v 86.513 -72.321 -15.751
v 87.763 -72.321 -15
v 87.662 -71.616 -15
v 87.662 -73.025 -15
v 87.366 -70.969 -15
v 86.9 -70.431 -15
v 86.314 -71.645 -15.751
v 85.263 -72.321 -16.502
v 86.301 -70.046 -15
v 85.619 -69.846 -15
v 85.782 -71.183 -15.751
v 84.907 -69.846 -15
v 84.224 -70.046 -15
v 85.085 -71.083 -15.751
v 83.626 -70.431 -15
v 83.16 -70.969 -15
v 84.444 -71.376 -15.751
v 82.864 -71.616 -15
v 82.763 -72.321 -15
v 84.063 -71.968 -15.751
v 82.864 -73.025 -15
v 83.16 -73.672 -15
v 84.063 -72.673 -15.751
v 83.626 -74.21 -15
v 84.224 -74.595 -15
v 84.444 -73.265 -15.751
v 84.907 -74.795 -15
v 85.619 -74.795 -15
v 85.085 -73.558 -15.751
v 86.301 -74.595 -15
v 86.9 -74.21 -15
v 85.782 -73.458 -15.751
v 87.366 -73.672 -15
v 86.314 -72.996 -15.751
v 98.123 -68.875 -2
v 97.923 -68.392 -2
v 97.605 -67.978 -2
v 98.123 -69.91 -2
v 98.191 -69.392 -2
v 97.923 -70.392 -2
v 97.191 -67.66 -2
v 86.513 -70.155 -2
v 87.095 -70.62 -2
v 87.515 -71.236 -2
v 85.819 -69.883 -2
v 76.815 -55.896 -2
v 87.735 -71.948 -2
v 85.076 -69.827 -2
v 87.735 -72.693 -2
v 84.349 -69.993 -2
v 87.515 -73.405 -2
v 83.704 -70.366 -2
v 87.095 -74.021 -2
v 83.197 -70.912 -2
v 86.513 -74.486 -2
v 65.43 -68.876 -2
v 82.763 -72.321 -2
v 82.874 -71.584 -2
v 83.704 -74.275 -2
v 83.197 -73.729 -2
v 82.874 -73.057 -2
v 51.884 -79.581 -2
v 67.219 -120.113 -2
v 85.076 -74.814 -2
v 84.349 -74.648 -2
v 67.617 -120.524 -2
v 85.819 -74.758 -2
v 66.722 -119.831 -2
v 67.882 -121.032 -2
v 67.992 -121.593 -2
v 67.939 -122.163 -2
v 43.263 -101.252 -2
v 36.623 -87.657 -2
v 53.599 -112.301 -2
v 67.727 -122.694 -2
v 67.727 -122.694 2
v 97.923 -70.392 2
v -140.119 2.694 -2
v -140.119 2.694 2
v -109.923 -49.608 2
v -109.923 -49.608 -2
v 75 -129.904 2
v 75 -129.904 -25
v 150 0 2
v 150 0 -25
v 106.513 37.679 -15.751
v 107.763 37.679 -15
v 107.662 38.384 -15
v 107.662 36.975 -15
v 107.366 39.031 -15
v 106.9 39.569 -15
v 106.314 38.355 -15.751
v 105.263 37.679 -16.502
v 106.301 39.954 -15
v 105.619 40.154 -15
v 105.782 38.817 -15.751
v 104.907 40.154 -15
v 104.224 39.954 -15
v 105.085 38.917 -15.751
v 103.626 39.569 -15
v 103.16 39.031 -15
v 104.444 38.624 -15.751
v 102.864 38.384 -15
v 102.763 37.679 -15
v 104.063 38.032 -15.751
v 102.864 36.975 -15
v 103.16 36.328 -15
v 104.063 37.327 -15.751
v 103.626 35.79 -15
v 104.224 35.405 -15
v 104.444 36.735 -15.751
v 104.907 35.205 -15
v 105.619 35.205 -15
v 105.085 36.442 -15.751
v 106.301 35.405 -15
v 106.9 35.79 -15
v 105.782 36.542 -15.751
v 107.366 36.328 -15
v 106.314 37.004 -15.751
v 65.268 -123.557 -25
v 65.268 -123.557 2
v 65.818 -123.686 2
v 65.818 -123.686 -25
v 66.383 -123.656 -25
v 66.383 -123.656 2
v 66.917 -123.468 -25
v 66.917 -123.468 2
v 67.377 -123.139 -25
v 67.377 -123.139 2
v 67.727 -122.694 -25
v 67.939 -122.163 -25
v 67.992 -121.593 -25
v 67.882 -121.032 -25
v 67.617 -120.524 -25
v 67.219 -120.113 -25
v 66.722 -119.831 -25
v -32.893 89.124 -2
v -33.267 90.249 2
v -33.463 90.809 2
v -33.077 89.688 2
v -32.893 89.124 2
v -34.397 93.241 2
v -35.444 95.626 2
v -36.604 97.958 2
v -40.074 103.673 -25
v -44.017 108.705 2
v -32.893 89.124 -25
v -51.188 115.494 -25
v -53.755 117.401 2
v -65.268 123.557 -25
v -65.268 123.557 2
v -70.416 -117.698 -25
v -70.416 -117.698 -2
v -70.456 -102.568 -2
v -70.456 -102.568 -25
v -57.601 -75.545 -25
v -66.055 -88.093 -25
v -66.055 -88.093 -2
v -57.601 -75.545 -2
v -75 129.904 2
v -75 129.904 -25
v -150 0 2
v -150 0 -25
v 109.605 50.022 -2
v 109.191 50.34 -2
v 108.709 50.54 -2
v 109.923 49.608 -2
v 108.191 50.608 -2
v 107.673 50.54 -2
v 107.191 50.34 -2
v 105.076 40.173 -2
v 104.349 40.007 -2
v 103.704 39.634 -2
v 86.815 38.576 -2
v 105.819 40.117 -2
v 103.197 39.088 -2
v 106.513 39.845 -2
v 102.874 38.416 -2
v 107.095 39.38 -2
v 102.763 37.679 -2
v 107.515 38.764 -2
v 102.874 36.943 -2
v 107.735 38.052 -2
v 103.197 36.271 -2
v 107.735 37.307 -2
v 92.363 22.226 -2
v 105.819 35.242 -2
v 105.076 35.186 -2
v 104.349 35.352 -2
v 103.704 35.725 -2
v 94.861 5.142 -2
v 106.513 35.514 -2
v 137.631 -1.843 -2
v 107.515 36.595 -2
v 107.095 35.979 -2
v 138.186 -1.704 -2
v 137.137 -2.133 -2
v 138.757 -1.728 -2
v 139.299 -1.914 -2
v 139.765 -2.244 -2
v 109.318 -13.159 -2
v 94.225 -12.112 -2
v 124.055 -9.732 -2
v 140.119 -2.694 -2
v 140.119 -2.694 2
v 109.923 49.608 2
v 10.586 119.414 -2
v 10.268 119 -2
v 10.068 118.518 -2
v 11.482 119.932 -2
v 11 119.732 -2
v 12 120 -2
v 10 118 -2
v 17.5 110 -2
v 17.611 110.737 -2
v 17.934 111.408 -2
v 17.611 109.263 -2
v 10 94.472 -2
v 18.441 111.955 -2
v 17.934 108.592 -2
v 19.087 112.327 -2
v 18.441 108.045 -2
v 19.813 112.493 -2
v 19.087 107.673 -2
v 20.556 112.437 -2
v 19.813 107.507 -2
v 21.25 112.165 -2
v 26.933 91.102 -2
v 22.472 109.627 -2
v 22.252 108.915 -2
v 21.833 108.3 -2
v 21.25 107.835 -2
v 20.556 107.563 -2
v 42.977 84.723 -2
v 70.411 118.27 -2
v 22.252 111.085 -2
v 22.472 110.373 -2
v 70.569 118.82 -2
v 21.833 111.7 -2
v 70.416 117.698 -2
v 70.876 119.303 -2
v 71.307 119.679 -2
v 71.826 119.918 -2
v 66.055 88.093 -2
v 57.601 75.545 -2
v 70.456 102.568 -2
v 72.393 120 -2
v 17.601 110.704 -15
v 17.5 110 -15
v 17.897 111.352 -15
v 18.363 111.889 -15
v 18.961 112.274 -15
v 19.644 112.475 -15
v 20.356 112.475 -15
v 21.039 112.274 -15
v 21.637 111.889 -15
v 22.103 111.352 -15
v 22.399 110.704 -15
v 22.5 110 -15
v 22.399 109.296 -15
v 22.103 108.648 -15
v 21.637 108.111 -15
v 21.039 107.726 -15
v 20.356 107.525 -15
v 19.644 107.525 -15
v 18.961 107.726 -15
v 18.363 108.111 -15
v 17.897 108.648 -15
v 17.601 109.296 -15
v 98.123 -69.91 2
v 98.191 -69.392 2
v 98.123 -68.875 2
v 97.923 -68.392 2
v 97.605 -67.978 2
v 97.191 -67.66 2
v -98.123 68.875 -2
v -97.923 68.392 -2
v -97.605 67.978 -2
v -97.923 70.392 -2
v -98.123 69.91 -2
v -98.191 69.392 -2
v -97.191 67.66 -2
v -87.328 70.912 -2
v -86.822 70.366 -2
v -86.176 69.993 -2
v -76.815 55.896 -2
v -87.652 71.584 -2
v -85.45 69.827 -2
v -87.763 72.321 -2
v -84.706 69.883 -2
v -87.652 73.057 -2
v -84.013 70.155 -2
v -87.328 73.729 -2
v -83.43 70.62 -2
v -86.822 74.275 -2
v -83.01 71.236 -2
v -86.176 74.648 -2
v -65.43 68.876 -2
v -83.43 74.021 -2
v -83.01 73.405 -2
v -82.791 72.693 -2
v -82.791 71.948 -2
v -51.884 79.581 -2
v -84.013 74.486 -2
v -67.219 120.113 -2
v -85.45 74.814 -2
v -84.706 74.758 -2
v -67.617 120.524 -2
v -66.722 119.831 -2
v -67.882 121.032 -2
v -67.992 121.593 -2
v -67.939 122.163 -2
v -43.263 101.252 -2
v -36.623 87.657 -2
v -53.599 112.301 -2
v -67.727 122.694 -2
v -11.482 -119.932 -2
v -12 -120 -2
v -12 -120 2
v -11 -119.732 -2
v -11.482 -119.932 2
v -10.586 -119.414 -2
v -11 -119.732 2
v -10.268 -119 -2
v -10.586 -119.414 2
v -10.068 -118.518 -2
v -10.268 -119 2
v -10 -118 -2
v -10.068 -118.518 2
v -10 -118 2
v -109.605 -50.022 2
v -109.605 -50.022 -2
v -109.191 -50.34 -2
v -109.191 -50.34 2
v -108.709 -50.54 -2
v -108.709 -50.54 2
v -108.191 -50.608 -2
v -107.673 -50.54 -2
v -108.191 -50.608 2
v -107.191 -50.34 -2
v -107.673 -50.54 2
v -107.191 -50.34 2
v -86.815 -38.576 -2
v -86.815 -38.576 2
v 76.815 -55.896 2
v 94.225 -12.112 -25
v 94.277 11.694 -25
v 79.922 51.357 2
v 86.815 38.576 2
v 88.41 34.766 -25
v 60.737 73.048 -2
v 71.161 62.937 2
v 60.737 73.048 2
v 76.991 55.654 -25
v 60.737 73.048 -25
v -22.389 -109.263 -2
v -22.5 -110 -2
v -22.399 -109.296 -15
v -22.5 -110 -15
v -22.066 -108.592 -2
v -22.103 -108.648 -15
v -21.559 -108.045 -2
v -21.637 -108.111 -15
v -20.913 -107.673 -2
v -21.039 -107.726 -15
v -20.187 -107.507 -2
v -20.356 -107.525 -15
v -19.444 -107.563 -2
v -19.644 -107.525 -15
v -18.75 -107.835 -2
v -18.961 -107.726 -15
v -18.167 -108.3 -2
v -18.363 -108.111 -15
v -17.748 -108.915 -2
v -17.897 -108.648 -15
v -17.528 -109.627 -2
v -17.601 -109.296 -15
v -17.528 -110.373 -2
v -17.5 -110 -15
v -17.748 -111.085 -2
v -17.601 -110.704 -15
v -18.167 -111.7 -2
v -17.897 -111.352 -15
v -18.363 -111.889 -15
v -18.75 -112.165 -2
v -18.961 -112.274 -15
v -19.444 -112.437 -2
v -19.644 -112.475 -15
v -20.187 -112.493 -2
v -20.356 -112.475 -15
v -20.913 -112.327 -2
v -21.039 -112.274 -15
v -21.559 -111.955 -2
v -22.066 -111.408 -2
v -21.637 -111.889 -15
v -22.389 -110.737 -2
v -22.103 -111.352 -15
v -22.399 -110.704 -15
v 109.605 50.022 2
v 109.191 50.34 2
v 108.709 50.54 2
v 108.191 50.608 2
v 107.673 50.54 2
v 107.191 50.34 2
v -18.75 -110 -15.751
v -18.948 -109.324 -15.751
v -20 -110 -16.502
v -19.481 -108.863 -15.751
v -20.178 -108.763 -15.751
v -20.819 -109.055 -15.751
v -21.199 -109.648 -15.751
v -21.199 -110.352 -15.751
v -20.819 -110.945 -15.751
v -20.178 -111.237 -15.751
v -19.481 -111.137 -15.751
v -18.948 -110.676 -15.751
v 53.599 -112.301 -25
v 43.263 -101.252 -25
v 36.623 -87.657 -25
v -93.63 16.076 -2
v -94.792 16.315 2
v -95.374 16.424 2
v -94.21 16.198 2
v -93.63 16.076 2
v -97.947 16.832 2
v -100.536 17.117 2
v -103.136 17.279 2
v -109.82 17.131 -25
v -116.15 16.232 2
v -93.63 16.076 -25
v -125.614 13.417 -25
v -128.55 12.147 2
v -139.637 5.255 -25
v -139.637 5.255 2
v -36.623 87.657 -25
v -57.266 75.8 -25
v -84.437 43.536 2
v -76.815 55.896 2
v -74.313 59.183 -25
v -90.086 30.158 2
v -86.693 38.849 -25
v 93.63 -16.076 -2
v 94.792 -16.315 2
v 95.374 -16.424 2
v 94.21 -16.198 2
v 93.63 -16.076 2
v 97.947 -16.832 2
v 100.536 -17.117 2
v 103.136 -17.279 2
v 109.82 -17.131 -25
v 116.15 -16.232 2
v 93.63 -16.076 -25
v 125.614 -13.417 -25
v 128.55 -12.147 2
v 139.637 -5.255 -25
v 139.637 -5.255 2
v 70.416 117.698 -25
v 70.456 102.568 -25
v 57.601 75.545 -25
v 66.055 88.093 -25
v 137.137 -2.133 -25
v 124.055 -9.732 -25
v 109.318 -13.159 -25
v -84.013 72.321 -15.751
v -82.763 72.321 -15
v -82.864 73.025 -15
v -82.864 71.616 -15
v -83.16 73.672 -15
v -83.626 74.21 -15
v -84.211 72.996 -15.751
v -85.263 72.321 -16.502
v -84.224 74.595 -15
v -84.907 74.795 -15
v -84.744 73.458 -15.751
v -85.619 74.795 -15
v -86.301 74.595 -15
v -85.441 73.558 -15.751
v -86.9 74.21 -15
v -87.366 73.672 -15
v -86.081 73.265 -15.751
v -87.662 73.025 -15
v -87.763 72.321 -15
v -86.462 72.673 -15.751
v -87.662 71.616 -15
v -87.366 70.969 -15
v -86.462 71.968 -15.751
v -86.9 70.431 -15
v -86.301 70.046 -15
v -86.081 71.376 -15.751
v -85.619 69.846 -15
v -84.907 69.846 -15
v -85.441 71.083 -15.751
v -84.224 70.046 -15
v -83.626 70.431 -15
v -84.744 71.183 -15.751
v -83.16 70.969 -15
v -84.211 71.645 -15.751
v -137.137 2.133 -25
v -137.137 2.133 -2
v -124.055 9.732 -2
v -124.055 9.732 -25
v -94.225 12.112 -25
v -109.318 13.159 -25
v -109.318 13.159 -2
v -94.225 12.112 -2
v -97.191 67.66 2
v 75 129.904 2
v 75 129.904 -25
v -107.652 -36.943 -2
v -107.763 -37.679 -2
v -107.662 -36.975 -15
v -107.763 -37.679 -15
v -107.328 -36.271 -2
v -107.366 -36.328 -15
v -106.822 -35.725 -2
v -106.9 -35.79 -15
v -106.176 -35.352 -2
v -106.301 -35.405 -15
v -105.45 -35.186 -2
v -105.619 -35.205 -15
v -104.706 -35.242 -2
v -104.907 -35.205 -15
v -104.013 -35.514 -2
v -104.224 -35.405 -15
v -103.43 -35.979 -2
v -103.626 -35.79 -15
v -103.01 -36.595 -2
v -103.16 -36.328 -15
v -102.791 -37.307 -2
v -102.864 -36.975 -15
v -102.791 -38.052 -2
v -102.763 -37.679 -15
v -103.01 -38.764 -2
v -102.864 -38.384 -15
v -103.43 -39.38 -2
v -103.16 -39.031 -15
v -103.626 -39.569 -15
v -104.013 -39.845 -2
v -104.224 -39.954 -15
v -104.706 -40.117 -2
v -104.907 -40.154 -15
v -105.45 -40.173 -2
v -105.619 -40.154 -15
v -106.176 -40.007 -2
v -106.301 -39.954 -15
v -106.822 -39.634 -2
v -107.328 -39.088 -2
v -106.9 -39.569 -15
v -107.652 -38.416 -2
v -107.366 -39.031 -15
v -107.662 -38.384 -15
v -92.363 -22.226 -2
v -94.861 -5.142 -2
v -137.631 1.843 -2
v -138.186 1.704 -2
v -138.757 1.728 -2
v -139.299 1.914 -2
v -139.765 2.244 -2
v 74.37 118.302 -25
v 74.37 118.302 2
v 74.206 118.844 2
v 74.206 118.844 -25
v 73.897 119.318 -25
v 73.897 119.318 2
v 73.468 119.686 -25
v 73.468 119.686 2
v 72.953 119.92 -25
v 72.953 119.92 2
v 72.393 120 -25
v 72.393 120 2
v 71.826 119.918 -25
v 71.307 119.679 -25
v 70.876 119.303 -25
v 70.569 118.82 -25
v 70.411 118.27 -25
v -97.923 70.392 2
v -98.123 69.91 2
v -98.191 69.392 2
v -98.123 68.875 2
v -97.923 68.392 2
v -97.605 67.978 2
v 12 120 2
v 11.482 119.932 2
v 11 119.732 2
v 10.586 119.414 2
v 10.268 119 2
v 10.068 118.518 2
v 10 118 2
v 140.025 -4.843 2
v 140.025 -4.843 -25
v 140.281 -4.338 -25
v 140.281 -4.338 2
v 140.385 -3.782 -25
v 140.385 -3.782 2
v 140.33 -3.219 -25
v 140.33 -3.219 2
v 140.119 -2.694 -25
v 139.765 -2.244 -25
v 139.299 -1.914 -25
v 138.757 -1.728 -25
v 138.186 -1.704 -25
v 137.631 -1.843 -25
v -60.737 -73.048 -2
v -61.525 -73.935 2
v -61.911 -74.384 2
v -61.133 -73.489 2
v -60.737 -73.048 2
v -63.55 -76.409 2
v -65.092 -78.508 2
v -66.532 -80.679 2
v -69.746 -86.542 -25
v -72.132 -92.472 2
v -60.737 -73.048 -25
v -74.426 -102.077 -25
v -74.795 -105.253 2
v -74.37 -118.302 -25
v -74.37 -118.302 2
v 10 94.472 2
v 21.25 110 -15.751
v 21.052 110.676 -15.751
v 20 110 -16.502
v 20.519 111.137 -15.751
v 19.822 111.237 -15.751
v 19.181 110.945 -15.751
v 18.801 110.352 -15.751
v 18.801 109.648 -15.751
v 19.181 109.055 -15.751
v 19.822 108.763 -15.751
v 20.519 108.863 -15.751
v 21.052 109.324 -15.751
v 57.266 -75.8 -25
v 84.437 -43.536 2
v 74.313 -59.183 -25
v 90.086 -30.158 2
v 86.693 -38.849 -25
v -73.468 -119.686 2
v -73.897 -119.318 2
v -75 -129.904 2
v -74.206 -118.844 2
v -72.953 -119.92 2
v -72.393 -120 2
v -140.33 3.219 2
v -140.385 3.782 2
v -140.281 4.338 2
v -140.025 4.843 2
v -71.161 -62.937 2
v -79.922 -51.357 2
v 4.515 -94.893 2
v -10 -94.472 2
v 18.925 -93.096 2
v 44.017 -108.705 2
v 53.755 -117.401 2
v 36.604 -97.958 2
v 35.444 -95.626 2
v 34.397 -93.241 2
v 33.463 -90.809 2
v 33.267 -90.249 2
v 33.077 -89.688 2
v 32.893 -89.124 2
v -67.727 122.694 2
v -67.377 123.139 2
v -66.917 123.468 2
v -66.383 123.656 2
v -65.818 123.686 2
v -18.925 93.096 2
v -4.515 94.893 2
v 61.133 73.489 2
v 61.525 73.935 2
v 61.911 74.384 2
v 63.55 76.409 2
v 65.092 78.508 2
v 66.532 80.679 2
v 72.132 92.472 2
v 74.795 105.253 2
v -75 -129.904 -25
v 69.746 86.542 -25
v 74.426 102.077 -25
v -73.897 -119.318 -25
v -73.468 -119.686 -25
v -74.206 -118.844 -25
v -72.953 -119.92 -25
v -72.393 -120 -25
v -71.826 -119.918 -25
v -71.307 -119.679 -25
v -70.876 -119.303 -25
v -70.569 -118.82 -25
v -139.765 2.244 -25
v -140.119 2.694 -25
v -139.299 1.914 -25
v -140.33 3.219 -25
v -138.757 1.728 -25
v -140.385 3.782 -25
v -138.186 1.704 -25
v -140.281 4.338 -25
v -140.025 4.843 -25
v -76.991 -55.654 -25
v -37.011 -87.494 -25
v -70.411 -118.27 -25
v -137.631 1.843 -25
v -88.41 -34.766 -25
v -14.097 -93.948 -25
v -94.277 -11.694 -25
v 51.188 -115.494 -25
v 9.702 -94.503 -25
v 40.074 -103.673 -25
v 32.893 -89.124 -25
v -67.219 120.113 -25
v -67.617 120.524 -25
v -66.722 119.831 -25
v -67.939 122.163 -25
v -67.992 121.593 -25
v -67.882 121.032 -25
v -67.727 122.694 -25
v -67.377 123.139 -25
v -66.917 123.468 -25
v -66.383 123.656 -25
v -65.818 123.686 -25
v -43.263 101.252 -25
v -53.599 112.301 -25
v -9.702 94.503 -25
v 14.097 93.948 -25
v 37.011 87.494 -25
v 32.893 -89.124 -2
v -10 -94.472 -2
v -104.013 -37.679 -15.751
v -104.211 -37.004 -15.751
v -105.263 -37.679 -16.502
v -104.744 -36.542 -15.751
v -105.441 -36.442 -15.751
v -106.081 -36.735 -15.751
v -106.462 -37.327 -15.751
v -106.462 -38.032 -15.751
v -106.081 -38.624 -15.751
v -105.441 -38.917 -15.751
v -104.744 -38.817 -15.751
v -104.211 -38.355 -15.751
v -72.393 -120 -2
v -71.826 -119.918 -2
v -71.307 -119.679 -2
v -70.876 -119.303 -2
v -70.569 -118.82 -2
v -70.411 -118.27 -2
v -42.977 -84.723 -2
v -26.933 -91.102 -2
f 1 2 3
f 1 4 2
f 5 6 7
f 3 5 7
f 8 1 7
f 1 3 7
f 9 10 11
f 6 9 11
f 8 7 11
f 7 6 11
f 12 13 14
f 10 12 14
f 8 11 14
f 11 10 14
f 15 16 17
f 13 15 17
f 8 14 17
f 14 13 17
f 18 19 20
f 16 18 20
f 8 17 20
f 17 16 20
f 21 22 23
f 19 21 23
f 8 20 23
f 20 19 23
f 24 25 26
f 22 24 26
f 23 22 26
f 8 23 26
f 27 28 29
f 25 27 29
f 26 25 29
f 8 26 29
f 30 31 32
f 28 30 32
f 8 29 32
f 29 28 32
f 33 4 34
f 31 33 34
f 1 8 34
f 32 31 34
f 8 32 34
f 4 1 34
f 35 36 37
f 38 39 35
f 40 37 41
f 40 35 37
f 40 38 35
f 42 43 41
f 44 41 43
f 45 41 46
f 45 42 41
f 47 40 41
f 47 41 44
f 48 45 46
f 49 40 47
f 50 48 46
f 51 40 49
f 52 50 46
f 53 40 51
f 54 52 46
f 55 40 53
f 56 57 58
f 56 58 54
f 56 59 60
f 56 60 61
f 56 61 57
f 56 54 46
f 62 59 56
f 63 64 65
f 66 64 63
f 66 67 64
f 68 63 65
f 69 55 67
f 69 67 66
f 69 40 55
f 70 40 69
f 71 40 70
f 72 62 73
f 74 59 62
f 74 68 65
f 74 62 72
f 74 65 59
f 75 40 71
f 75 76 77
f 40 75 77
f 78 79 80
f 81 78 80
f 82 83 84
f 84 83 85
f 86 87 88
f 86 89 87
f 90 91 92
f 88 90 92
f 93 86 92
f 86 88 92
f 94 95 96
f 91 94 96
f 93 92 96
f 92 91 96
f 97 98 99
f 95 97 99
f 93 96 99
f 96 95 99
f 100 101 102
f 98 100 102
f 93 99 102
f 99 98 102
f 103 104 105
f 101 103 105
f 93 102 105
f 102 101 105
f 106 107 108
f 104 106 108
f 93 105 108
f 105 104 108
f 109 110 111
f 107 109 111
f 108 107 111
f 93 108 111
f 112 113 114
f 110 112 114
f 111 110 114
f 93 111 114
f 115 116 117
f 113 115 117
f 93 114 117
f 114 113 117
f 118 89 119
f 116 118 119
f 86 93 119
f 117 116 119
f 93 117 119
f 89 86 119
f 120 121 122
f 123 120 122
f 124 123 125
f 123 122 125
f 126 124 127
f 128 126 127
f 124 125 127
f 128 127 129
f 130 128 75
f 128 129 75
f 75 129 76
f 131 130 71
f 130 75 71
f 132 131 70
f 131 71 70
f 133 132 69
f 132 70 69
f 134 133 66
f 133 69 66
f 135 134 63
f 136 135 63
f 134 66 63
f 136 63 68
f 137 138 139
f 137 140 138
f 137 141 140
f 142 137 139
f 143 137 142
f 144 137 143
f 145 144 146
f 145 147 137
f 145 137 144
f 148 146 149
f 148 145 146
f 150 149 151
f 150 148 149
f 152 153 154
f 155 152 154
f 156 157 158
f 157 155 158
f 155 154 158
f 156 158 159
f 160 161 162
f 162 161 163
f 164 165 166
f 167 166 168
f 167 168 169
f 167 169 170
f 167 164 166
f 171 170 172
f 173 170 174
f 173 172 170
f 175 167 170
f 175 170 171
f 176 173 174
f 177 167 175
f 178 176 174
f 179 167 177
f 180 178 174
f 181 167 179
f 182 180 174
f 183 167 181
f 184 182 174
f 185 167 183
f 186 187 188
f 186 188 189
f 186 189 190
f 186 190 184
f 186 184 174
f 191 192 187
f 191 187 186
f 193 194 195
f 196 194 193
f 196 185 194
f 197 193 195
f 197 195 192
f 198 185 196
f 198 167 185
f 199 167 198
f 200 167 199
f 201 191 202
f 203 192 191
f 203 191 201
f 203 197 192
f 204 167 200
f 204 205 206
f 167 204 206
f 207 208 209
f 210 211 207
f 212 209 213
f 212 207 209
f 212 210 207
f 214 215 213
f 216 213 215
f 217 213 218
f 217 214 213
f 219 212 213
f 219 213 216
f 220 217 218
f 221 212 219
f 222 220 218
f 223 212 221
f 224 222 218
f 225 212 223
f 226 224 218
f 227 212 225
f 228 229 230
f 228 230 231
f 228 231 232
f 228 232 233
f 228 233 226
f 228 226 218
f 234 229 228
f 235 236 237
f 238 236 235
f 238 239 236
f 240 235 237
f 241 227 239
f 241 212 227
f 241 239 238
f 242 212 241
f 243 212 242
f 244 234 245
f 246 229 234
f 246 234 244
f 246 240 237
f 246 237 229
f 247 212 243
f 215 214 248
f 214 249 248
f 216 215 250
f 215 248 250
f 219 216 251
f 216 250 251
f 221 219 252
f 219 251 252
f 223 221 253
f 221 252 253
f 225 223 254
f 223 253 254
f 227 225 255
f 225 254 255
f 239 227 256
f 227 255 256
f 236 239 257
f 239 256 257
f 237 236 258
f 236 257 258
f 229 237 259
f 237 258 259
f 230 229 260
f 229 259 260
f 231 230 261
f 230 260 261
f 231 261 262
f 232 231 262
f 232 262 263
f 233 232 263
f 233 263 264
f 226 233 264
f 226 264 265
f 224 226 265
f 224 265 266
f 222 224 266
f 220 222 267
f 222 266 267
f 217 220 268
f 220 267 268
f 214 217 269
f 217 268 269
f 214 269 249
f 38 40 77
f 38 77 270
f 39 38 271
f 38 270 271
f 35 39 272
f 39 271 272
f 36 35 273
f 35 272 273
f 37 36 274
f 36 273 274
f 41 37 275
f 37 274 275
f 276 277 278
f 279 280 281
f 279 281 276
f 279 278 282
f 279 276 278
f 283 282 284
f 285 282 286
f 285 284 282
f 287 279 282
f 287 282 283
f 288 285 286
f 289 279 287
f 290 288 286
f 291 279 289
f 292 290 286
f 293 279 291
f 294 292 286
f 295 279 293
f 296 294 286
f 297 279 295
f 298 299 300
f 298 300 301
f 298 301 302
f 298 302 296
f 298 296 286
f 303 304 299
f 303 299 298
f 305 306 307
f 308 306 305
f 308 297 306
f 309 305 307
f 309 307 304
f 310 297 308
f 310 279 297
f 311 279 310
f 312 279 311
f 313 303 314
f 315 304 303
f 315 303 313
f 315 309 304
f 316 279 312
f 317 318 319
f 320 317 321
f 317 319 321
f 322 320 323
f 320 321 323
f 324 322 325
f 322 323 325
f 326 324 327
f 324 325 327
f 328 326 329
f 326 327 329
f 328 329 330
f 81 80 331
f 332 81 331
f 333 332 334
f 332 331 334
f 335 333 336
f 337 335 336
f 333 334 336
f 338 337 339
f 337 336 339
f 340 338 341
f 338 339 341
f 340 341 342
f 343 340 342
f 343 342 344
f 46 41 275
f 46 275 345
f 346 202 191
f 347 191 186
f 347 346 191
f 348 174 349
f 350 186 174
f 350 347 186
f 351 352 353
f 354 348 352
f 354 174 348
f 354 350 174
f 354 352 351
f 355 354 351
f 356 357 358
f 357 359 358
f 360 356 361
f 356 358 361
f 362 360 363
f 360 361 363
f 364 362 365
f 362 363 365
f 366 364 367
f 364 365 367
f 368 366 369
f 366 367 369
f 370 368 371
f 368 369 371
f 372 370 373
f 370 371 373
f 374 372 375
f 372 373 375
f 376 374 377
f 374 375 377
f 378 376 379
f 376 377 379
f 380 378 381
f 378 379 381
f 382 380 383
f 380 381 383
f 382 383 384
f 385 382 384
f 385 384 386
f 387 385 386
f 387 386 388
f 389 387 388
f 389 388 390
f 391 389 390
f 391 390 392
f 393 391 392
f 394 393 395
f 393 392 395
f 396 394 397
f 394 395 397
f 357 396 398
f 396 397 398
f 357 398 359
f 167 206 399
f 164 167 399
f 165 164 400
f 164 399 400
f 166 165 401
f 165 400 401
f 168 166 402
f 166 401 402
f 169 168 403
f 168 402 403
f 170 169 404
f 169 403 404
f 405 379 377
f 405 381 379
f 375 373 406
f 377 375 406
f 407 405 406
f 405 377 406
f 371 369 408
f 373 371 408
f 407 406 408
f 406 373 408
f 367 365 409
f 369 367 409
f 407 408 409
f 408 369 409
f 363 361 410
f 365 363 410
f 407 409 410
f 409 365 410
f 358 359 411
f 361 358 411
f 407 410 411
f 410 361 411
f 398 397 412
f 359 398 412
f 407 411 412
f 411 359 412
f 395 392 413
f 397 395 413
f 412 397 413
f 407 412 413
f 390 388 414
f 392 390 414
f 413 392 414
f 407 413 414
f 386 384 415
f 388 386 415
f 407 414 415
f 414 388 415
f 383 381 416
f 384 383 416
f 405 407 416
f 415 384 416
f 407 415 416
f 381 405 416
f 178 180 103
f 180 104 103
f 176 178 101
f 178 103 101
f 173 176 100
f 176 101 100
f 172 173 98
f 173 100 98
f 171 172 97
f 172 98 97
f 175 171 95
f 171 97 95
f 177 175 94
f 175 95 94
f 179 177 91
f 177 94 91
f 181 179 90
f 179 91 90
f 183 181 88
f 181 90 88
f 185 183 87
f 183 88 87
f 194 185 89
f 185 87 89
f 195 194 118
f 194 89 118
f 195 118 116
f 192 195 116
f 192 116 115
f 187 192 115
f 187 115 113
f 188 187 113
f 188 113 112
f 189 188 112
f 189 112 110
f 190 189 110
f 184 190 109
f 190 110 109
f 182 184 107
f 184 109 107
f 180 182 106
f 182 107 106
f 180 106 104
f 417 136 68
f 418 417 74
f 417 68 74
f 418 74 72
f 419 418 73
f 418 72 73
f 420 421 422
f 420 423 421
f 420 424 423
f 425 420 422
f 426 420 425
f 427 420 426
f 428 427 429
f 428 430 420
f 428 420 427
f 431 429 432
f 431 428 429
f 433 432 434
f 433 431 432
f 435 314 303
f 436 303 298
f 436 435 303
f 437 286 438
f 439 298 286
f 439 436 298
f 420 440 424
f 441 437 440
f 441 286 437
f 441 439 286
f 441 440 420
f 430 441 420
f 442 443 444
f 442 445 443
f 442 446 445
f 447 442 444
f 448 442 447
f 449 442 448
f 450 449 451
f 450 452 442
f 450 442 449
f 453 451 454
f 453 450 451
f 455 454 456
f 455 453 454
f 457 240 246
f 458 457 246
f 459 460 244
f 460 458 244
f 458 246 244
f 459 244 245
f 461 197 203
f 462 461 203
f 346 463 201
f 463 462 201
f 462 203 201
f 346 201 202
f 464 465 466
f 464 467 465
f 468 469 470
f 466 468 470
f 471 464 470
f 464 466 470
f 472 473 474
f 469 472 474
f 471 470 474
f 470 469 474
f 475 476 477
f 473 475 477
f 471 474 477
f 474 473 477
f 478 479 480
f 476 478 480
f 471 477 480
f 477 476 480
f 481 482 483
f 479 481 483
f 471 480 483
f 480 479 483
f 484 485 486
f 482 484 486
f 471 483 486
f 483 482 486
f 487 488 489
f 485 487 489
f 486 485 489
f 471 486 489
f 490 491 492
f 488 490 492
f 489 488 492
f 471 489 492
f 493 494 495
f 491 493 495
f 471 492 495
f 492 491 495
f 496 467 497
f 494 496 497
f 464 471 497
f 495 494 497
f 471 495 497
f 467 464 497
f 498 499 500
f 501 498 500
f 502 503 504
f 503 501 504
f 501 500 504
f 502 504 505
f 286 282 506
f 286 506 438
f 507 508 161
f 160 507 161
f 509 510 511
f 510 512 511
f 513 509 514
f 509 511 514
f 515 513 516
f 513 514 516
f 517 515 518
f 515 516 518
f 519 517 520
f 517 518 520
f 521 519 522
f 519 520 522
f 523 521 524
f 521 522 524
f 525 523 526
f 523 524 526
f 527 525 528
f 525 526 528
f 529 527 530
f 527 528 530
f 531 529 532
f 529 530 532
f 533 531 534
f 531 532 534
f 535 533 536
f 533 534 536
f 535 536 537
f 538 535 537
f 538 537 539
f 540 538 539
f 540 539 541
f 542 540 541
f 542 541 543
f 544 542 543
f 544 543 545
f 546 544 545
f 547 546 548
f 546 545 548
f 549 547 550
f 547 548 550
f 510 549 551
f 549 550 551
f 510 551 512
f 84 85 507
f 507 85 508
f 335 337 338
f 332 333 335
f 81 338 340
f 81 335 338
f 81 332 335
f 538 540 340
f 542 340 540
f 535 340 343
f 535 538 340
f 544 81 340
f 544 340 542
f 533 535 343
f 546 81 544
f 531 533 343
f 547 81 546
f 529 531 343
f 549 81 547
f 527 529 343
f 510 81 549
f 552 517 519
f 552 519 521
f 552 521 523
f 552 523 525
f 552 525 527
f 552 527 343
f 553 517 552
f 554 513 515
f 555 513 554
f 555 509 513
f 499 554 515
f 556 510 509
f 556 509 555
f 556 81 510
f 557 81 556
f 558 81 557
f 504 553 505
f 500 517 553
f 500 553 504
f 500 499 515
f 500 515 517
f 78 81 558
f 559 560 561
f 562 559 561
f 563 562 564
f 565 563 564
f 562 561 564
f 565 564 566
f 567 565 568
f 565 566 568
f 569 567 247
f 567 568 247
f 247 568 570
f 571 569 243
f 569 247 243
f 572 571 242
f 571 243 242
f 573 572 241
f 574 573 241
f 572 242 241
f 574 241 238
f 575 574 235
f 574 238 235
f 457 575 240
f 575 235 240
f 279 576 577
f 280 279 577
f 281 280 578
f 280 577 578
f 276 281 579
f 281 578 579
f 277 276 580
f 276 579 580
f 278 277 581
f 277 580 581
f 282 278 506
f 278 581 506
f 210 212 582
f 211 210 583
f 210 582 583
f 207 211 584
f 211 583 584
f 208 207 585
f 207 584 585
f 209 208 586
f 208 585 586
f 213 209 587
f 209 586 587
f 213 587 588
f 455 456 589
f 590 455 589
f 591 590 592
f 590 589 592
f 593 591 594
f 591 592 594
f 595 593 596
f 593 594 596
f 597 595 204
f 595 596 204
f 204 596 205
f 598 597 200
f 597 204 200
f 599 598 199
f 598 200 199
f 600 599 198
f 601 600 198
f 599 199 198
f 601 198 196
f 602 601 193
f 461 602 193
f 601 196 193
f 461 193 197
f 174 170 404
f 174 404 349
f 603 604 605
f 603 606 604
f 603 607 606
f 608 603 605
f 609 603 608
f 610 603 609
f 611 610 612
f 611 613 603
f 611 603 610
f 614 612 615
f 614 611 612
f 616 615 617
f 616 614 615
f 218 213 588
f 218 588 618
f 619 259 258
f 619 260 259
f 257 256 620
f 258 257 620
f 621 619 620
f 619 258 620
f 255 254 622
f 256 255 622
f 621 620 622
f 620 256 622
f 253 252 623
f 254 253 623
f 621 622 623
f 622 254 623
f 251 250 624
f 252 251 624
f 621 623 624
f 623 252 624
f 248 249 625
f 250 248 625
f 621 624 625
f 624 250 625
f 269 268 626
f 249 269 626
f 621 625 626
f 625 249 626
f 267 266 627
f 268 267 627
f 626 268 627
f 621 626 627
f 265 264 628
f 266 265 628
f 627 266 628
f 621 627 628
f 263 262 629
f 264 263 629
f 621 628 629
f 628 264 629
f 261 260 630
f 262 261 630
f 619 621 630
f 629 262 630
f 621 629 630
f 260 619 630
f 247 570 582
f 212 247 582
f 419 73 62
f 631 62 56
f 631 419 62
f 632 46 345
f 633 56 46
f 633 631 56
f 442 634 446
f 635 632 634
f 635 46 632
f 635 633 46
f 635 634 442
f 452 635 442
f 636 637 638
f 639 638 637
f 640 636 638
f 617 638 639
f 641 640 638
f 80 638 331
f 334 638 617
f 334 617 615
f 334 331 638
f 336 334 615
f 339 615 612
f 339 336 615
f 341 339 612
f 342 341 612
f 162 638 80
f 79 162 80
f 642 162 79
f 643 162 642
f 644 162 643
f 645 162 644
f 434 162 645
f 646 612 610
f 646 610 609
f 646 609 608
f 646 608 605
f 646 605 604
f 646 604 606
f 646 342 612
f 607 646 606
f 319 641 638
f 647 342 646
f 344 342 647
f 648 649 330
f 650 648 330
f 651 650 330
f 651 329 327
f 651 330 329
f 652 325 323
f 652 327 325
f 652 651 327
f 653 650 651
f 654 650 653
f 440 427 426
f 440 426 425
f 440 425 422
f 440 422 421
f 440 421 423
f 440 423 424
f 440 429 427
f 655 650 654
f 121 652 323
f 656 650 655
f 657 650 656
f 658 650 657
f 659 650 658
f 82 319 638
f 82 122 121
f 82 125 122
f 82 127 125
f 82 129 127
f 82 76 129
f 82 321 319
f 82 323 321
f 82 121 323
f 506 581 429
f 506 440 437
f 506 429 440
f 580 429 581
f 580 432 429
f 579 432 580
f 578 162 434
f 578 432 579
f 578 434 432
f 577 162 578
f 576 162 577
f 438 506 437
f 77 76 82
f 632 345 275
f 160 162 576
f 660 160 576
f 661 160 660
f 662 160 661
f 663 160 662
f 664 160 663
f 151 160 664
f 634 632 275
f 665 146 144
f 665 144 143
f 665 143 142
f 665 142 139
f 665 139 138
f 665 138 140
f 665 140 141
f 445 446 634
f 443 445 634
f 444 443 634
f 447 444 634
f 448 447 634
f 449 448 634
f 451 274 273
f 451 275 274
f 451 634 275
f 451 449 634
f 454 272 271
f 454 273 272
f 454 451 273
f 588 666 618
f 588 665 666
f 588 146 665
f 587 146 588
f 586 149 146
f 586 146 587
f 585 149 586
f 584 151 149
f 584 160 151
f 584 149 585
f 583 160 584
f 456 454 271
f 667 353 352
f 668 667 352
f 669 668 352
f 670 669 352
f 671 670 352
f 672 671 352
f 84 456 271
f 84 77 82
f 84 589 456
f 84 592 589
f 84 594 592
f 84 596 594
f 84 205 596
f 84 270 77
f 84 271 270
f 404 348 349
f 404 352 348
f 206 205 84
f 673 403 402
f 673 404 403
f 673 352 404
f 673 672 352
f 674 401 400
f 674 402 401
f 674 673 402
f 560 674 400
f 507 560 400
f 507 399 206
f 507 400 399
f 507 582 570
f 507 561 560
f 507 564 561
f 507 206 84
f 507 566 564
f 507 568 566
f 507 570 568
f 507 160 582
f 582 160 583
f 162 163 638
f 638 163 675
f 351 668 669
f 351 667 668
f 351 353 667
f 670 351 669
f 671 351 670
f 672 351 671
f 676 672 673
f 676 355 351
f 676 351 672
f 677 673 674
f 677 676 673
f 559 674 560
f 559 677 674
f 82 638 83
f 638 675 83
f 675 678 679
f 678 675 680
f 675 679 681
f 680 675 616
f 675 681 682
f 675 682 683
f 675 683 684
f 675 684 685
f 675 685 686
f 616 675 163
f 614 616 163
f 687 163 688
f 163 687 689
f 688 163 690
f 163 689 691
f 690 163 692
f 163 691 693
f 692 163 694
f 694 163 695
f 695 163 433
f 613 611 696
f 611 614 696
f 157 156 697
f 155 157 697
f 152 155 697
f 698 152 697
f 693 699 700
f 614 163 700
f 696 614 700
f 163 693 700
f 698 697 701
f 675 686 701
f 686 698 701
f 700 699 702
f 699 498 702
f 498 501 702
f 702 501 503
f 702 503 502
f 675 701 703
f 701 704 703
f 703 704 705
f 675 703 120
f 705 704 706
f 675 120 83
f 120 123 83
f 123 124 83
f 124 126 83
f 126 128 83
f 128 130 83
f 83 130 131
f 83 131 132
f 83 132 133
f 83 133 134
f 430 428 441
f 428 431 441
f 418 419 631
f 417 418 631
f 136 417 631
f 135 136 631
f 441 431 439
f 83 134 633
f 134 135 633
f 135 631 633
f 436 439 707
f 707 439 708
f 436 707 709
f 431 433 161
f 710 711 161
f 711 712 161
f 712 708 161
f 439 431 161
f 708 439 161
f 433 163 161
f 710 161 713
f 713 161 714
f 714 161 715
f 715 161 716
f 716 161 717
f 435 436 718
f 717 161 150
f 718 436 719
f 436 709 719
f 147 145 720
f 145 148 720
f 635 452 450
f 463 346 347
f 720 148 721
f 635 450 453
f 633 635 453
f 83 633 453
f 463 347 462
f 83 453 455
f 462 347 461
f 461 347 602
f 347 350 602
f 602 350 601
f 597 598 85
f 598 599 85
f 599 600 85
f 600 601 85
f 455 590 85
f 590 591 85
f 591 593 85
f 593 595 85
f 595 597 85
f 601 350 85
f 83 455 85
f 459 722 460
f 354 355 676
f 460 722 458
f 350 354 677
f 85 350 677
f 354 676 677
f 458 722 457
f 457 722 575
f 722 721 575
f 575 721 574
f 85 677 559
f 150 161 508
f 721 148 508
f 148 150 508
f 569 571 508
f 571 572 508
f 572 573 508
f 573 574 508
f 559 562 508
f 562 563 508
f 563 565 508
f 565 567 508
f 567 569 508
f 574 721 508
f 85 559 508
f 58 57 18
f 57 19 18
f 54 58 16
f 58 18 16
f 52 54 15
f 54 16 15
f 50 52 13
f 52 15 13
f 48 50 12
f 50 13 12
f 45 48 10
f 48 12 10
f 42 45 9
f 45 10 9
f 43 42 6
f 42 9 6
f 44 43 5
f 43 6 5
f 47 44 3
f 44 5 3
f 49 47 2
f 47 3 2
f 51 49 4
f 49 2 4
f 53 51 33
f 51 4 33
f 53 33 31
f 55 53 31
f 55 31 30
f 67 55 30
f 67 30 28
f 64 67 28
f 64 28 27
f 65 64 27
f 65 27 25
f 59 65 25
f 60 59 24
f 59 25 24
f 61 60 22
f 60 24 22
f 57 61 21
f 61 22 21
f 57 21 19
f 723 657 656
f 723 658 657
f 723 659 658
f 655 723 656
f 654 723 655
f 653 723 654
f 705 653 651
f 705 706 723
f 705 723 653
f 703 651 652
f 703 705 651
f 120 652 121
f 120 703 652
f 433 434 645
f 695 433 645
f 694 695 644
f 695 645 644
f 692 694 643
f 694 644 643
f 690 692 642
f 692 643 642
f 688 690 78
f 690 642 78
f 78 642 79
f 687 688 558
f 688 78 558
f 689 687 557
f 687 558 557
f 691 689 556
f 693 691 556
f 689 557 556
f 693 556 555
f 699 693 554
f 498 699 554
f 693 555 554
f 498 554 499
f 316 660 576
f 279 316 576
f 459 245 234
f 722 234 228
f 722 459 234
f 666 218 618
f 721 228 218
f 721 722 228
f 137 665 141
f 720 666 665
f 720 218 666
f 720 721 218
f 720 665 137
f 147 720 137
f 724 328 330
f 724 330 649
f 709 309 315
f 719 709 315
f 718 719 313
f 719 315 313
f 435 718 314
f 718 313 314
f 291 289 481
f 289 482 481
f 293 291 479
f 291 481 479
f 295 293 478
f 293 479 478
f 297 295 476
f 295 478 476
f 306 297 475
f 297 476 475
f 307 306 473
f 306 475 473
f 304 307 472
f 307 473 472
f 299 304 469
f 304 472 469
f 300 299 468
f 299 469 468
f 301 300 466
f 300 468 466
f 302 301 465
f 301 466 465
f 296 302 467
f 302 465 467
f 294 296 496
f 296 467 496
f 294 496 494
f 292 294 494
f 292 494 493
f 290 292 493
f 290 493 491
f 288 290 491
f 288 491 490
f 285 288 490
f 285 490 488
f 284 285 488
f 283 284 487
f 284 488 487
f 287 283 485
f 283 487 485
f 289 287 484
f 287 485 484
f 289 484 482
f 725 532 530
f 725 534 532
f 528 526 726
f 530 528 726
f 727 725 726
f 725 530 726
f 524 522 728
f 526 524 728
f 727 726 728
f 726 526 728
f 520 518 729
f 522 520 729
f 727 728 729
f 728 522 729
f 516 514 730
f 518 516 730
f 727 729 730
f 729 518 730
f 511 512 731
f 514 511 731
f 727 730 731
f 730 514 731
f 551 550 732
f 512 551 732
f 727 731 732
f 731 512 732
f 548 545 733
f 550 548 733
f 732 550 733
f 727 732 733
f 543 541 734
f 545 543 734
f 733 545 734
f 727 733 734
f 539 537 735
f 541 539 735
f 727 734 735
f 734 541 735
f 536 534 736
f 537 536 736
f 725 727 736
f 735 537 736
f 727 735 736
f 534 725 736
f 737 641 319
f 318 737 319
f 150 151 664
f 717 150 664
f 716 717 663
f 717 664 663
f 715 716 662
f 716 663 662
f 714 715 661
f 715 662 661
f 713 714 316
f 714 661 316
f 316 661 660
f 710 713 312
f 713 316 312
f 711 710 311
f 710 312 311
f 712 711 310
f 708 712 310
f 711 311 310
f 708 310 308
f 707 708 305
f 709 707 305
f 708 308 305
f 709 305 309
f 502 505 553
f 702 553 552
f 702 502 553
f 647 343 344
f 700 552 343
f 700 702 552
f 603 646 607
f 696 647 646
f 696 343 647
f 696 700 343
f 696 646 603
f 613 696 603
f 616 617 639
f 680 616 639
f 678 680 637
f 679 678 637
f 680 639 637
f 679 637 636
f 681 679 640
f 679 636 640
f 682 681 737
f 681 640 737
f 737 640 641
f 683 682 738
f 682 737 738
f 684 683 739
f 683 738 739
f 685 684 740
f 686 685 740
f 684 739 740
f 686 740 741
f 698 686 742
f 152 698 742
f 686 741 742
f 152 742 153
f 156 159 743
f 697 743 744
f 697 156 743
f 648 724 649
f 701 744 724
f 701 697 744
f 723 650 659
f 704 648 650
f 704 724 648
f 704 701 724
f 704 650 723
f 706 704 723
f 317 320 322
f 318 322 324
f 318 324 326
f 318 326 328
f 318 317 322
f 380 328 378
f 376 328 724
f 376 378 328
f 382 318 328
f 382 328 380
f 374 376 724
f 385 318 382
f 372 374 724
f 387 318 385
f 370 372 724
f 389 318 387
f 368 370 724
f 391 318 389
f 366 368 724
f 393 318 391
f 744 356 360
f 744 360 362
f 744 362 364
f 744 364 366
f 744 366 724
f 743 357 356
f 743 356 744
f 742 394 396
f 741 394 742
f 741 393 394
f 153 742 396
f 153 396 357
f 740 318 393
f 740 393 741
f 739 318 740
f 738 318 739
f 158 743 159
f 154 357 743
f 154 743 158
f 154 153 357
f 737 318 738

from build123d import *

# Parameters (mm, degrees)
F0_R          = 95
F1_DEPTH      = 25
F1_DEPTH_BACK = 2
F4_DEPTH      = 25
F4_DEPTH_BACK = 2
F5_COUNT      = 6
F8_DEPTH      = 10
F8_DEPTH_BACK = 35
F9_COUNT      = 6
F11_D         = 5
F11_DEPTH     = 13
F11_START     = 2
F11_TIP       = 1.5021515476


with BuildPart() as f1:
    # F0 (on Top) → F1 (new body, two sides)
    with BuildSketch(Plane.XY) as f1_sk:
        Polygon((75, 129.9038105677), (-75, 129.9038105677), (-150, 0), (-75, -129.9038105677), (75, -129.9038105677), (150, 0), align=None)
        Circle(F0_R, mode=Mode.SUBTRACT)
    extrude(amount=-F1_DEPTH)
    extrude(f1_sk.sketch, amount=F1_DEPTH_BACK)


with BuildPart() as f4:
    # F2 (on Top) → F4 (new body, two sides)
    with BuildSketch(Plane.XY) as f4_sk:
        with BuildLine():
            Line((-67.7266746593, 122.6939584625), (-97.9230484541, 70.3923048454))
            ThreePointArc((-97.9230484541, 70.3923048454), (-98.1228492991, 68.8746667552), (-97.1909976466, 67.6602540378))
            Line((-97.1909976466, 67.6602540378), (-68.1009575861, 50.8651115782))
            ThreePointArc((-68.1009575861, 50.8651115782), (-51.4015287339, 67.6969928713), (-30.7025049427, 79.2613158498))
            ThreePointArc((-30.7025049427, 79.2613158498), (-31.770388613, 85.1096644737), (-33.4632679534, 90.8085868892))
            ThreePointArc((-33.4632679534, 90.8085868892), (-34.9064435535, 94.4392315422), (-36.6037204033, 97.9582637535))
            ThreePointArc((-36.6037204033, 97.9582637535), (-48.6270197595, 113.3426973797), (-65.2675230757, 123.5571075336))
            ThreePointArc((-65.2675230757, 123.5571075336), (-66.656996648, 123.5810891624), (-67.7266746593, 122.6939584625))
        make_face()
    extrude(amount=F4_DEPTH)
    extrude(f4_sk.sketch, amount=-F4_DEPTH_BACK)


with BuildPart() as f5_1:
    # F5: instance of F4
    add(f4.part.rotate(Axis((0, 0, -0.1854561269), (0, 0, 1)), 1 * 360 / F5_COUNT))


with BuildPart() as f5_2:
    # F5: instance of F4
    add(f4.part.rotate(Axis((0, 0, -0.1854561269), (0, 0, 1)), 2 * 360 / F5_COUNT))


with BuildPart() as f5_3:
    # F5: instance of F4
    add(f4.part.rotate(Axis((0, 0, -0.1854561269), (0, 0, 1)), 3 * 360 / F5_COUNT))


with BuildPart() as f5_4:
    # F5: instance of F4
    add(f4.part.rotate(Axis((0, 0, -0.1854561269), (0, 0, 1)), 4 * 360 / F5_COUNT))


with BuildPart() as f5_5:
    # F5: instance of F4
    add(f4.part.rotate(Axis((0, 0, -0.1854561269), (0, 0, 1)), 5 * 360 / F5_COUNT))


with BuildPart() as f1_1:
    add(f1.part)

    # F6: cut F5_1, F4, F5_5, F5_4, F5_3, F5_2
    add(f5_1.part, mode=Mode.SUBTRACT)
    add(f4.part, mode=Mode.SUBTRACT)
    add(f5_5.part, mode=Mode.SUBTRACT)
    add(f5_4.part, mode=Mode.SUBTRACT)
    add(f5_3.part, mode=Mode.SUBTRACT)
    add(f5_2.part, mode=Mode.SUBTRACT)


with BuildPart() as f8:
    # F7 (on face) → F8 (new body, two sides)
    with BuildSketch(Plane.XY) as f8_sk:
        with BuildLine():
            ThreePointArc((-66.7217246277, 119.8308093913), (-44.7195832857, 103.2599332678), (-34.5435296861, 77.6643068393))
            ThreePointArc((-34.5435296861, 77.6643068393), (-32.6327882373, 78.4863117484), (-30.7025049427, 79.2613158498))
            ThreePointArc((-30.7025049427, 79.2613158498), (-41.9019572207, 106.1559598637), (-65.2675230757, 123.5571075336))
            ThreePointArc((-65.2675230757, 123.5571075336), (-66.656996648, 123.5810891624), (-67.7266746593, 122.6939584625))
            ThreePointArc((-67.7266746593, 122.6939584625), (-67.8817545517, 121.0315856662), (-66.7217246277, 119.8308093913))
        make_face()
    extrude(amount=F8_DEPTH)
    extrude(f8_sk.sketch, amount=-F8_DEPTH_BACK)


with BuildPart() as f9_1:
    # F9: instance of F8
    add(f8.part.rotate(Axis((0, 0, -0.1854561269), (0, 0, 1)), 1 * 360 / F9_COUNT))


with BuildPart() as f9_2:
    # F9: instance of F8
    add(f8.part.rotate(Axis((0, 0, -0.1854561269), (0, 0, 1)), 2 * 360 / F9_COUNT))


with BuildPart() as f9_3:
    # F9: instance of F8
    add(f8.part.rotate(Axis((0, 0, -0.1854561269), (0, 0, 1)), 3 * 360 / F9_COUNT))


with BuildPart() as f9_4:
    # F9: instance of F8
    add(f8.part.rotate(Axis((0, 0, -0.1854561269), (0, 0, 1)), 4 * 360 / F9_COUNT))


with BuildPart() as f9_5:
    # F9: instance of F8
    add(f8.part.rotate(Axis((0, 0, -0.1854561269), (0, 0, 1)), 5 * 360 / F9_COUNT))


with BuildPart() as f1_2:
    add(f1_1.part)

    # F10: cut F8, F9_5, F9_4, F9_3, F9_2, F9_1
    add(f8.part, mode=Mode.SUBTRACT)
    add(f9_5.part, mode=Mode.SUBTRACT)
    add(f9_4.part, mode=Mode.SUBTRACT)
    add(f9_3.part, mode=Mode.SUBTRACT)
    add(f9_2.part, mode=Mode.SUBTRACT)
    add(f9_1.part, mode=Mode.SUBTRACT)

    # F11
    # its depths count from where the whole tool has entered the part; down to there all is cleared
    with Locations(Plane.XY.offset(-F11_START)):
        with Locations((20, 110), (105.2627944163, 37.6794919243), (85.2627944163, -72.3205080757), (-20, -110), (-105.2627944163, -37.6794919243), (-85.2627944163, 72.3205080757)):
            Hole(F11_D / 2, depth=F11_DEPTH)
            with Locations((0, 0, -(F11_DEPTH + F11_TIP / 2))):  # 118° drill point
                Cone(0, F11_D / 2, F11_TIP, mode=Mode.SUBTRACT)


solid = f1_2.part
